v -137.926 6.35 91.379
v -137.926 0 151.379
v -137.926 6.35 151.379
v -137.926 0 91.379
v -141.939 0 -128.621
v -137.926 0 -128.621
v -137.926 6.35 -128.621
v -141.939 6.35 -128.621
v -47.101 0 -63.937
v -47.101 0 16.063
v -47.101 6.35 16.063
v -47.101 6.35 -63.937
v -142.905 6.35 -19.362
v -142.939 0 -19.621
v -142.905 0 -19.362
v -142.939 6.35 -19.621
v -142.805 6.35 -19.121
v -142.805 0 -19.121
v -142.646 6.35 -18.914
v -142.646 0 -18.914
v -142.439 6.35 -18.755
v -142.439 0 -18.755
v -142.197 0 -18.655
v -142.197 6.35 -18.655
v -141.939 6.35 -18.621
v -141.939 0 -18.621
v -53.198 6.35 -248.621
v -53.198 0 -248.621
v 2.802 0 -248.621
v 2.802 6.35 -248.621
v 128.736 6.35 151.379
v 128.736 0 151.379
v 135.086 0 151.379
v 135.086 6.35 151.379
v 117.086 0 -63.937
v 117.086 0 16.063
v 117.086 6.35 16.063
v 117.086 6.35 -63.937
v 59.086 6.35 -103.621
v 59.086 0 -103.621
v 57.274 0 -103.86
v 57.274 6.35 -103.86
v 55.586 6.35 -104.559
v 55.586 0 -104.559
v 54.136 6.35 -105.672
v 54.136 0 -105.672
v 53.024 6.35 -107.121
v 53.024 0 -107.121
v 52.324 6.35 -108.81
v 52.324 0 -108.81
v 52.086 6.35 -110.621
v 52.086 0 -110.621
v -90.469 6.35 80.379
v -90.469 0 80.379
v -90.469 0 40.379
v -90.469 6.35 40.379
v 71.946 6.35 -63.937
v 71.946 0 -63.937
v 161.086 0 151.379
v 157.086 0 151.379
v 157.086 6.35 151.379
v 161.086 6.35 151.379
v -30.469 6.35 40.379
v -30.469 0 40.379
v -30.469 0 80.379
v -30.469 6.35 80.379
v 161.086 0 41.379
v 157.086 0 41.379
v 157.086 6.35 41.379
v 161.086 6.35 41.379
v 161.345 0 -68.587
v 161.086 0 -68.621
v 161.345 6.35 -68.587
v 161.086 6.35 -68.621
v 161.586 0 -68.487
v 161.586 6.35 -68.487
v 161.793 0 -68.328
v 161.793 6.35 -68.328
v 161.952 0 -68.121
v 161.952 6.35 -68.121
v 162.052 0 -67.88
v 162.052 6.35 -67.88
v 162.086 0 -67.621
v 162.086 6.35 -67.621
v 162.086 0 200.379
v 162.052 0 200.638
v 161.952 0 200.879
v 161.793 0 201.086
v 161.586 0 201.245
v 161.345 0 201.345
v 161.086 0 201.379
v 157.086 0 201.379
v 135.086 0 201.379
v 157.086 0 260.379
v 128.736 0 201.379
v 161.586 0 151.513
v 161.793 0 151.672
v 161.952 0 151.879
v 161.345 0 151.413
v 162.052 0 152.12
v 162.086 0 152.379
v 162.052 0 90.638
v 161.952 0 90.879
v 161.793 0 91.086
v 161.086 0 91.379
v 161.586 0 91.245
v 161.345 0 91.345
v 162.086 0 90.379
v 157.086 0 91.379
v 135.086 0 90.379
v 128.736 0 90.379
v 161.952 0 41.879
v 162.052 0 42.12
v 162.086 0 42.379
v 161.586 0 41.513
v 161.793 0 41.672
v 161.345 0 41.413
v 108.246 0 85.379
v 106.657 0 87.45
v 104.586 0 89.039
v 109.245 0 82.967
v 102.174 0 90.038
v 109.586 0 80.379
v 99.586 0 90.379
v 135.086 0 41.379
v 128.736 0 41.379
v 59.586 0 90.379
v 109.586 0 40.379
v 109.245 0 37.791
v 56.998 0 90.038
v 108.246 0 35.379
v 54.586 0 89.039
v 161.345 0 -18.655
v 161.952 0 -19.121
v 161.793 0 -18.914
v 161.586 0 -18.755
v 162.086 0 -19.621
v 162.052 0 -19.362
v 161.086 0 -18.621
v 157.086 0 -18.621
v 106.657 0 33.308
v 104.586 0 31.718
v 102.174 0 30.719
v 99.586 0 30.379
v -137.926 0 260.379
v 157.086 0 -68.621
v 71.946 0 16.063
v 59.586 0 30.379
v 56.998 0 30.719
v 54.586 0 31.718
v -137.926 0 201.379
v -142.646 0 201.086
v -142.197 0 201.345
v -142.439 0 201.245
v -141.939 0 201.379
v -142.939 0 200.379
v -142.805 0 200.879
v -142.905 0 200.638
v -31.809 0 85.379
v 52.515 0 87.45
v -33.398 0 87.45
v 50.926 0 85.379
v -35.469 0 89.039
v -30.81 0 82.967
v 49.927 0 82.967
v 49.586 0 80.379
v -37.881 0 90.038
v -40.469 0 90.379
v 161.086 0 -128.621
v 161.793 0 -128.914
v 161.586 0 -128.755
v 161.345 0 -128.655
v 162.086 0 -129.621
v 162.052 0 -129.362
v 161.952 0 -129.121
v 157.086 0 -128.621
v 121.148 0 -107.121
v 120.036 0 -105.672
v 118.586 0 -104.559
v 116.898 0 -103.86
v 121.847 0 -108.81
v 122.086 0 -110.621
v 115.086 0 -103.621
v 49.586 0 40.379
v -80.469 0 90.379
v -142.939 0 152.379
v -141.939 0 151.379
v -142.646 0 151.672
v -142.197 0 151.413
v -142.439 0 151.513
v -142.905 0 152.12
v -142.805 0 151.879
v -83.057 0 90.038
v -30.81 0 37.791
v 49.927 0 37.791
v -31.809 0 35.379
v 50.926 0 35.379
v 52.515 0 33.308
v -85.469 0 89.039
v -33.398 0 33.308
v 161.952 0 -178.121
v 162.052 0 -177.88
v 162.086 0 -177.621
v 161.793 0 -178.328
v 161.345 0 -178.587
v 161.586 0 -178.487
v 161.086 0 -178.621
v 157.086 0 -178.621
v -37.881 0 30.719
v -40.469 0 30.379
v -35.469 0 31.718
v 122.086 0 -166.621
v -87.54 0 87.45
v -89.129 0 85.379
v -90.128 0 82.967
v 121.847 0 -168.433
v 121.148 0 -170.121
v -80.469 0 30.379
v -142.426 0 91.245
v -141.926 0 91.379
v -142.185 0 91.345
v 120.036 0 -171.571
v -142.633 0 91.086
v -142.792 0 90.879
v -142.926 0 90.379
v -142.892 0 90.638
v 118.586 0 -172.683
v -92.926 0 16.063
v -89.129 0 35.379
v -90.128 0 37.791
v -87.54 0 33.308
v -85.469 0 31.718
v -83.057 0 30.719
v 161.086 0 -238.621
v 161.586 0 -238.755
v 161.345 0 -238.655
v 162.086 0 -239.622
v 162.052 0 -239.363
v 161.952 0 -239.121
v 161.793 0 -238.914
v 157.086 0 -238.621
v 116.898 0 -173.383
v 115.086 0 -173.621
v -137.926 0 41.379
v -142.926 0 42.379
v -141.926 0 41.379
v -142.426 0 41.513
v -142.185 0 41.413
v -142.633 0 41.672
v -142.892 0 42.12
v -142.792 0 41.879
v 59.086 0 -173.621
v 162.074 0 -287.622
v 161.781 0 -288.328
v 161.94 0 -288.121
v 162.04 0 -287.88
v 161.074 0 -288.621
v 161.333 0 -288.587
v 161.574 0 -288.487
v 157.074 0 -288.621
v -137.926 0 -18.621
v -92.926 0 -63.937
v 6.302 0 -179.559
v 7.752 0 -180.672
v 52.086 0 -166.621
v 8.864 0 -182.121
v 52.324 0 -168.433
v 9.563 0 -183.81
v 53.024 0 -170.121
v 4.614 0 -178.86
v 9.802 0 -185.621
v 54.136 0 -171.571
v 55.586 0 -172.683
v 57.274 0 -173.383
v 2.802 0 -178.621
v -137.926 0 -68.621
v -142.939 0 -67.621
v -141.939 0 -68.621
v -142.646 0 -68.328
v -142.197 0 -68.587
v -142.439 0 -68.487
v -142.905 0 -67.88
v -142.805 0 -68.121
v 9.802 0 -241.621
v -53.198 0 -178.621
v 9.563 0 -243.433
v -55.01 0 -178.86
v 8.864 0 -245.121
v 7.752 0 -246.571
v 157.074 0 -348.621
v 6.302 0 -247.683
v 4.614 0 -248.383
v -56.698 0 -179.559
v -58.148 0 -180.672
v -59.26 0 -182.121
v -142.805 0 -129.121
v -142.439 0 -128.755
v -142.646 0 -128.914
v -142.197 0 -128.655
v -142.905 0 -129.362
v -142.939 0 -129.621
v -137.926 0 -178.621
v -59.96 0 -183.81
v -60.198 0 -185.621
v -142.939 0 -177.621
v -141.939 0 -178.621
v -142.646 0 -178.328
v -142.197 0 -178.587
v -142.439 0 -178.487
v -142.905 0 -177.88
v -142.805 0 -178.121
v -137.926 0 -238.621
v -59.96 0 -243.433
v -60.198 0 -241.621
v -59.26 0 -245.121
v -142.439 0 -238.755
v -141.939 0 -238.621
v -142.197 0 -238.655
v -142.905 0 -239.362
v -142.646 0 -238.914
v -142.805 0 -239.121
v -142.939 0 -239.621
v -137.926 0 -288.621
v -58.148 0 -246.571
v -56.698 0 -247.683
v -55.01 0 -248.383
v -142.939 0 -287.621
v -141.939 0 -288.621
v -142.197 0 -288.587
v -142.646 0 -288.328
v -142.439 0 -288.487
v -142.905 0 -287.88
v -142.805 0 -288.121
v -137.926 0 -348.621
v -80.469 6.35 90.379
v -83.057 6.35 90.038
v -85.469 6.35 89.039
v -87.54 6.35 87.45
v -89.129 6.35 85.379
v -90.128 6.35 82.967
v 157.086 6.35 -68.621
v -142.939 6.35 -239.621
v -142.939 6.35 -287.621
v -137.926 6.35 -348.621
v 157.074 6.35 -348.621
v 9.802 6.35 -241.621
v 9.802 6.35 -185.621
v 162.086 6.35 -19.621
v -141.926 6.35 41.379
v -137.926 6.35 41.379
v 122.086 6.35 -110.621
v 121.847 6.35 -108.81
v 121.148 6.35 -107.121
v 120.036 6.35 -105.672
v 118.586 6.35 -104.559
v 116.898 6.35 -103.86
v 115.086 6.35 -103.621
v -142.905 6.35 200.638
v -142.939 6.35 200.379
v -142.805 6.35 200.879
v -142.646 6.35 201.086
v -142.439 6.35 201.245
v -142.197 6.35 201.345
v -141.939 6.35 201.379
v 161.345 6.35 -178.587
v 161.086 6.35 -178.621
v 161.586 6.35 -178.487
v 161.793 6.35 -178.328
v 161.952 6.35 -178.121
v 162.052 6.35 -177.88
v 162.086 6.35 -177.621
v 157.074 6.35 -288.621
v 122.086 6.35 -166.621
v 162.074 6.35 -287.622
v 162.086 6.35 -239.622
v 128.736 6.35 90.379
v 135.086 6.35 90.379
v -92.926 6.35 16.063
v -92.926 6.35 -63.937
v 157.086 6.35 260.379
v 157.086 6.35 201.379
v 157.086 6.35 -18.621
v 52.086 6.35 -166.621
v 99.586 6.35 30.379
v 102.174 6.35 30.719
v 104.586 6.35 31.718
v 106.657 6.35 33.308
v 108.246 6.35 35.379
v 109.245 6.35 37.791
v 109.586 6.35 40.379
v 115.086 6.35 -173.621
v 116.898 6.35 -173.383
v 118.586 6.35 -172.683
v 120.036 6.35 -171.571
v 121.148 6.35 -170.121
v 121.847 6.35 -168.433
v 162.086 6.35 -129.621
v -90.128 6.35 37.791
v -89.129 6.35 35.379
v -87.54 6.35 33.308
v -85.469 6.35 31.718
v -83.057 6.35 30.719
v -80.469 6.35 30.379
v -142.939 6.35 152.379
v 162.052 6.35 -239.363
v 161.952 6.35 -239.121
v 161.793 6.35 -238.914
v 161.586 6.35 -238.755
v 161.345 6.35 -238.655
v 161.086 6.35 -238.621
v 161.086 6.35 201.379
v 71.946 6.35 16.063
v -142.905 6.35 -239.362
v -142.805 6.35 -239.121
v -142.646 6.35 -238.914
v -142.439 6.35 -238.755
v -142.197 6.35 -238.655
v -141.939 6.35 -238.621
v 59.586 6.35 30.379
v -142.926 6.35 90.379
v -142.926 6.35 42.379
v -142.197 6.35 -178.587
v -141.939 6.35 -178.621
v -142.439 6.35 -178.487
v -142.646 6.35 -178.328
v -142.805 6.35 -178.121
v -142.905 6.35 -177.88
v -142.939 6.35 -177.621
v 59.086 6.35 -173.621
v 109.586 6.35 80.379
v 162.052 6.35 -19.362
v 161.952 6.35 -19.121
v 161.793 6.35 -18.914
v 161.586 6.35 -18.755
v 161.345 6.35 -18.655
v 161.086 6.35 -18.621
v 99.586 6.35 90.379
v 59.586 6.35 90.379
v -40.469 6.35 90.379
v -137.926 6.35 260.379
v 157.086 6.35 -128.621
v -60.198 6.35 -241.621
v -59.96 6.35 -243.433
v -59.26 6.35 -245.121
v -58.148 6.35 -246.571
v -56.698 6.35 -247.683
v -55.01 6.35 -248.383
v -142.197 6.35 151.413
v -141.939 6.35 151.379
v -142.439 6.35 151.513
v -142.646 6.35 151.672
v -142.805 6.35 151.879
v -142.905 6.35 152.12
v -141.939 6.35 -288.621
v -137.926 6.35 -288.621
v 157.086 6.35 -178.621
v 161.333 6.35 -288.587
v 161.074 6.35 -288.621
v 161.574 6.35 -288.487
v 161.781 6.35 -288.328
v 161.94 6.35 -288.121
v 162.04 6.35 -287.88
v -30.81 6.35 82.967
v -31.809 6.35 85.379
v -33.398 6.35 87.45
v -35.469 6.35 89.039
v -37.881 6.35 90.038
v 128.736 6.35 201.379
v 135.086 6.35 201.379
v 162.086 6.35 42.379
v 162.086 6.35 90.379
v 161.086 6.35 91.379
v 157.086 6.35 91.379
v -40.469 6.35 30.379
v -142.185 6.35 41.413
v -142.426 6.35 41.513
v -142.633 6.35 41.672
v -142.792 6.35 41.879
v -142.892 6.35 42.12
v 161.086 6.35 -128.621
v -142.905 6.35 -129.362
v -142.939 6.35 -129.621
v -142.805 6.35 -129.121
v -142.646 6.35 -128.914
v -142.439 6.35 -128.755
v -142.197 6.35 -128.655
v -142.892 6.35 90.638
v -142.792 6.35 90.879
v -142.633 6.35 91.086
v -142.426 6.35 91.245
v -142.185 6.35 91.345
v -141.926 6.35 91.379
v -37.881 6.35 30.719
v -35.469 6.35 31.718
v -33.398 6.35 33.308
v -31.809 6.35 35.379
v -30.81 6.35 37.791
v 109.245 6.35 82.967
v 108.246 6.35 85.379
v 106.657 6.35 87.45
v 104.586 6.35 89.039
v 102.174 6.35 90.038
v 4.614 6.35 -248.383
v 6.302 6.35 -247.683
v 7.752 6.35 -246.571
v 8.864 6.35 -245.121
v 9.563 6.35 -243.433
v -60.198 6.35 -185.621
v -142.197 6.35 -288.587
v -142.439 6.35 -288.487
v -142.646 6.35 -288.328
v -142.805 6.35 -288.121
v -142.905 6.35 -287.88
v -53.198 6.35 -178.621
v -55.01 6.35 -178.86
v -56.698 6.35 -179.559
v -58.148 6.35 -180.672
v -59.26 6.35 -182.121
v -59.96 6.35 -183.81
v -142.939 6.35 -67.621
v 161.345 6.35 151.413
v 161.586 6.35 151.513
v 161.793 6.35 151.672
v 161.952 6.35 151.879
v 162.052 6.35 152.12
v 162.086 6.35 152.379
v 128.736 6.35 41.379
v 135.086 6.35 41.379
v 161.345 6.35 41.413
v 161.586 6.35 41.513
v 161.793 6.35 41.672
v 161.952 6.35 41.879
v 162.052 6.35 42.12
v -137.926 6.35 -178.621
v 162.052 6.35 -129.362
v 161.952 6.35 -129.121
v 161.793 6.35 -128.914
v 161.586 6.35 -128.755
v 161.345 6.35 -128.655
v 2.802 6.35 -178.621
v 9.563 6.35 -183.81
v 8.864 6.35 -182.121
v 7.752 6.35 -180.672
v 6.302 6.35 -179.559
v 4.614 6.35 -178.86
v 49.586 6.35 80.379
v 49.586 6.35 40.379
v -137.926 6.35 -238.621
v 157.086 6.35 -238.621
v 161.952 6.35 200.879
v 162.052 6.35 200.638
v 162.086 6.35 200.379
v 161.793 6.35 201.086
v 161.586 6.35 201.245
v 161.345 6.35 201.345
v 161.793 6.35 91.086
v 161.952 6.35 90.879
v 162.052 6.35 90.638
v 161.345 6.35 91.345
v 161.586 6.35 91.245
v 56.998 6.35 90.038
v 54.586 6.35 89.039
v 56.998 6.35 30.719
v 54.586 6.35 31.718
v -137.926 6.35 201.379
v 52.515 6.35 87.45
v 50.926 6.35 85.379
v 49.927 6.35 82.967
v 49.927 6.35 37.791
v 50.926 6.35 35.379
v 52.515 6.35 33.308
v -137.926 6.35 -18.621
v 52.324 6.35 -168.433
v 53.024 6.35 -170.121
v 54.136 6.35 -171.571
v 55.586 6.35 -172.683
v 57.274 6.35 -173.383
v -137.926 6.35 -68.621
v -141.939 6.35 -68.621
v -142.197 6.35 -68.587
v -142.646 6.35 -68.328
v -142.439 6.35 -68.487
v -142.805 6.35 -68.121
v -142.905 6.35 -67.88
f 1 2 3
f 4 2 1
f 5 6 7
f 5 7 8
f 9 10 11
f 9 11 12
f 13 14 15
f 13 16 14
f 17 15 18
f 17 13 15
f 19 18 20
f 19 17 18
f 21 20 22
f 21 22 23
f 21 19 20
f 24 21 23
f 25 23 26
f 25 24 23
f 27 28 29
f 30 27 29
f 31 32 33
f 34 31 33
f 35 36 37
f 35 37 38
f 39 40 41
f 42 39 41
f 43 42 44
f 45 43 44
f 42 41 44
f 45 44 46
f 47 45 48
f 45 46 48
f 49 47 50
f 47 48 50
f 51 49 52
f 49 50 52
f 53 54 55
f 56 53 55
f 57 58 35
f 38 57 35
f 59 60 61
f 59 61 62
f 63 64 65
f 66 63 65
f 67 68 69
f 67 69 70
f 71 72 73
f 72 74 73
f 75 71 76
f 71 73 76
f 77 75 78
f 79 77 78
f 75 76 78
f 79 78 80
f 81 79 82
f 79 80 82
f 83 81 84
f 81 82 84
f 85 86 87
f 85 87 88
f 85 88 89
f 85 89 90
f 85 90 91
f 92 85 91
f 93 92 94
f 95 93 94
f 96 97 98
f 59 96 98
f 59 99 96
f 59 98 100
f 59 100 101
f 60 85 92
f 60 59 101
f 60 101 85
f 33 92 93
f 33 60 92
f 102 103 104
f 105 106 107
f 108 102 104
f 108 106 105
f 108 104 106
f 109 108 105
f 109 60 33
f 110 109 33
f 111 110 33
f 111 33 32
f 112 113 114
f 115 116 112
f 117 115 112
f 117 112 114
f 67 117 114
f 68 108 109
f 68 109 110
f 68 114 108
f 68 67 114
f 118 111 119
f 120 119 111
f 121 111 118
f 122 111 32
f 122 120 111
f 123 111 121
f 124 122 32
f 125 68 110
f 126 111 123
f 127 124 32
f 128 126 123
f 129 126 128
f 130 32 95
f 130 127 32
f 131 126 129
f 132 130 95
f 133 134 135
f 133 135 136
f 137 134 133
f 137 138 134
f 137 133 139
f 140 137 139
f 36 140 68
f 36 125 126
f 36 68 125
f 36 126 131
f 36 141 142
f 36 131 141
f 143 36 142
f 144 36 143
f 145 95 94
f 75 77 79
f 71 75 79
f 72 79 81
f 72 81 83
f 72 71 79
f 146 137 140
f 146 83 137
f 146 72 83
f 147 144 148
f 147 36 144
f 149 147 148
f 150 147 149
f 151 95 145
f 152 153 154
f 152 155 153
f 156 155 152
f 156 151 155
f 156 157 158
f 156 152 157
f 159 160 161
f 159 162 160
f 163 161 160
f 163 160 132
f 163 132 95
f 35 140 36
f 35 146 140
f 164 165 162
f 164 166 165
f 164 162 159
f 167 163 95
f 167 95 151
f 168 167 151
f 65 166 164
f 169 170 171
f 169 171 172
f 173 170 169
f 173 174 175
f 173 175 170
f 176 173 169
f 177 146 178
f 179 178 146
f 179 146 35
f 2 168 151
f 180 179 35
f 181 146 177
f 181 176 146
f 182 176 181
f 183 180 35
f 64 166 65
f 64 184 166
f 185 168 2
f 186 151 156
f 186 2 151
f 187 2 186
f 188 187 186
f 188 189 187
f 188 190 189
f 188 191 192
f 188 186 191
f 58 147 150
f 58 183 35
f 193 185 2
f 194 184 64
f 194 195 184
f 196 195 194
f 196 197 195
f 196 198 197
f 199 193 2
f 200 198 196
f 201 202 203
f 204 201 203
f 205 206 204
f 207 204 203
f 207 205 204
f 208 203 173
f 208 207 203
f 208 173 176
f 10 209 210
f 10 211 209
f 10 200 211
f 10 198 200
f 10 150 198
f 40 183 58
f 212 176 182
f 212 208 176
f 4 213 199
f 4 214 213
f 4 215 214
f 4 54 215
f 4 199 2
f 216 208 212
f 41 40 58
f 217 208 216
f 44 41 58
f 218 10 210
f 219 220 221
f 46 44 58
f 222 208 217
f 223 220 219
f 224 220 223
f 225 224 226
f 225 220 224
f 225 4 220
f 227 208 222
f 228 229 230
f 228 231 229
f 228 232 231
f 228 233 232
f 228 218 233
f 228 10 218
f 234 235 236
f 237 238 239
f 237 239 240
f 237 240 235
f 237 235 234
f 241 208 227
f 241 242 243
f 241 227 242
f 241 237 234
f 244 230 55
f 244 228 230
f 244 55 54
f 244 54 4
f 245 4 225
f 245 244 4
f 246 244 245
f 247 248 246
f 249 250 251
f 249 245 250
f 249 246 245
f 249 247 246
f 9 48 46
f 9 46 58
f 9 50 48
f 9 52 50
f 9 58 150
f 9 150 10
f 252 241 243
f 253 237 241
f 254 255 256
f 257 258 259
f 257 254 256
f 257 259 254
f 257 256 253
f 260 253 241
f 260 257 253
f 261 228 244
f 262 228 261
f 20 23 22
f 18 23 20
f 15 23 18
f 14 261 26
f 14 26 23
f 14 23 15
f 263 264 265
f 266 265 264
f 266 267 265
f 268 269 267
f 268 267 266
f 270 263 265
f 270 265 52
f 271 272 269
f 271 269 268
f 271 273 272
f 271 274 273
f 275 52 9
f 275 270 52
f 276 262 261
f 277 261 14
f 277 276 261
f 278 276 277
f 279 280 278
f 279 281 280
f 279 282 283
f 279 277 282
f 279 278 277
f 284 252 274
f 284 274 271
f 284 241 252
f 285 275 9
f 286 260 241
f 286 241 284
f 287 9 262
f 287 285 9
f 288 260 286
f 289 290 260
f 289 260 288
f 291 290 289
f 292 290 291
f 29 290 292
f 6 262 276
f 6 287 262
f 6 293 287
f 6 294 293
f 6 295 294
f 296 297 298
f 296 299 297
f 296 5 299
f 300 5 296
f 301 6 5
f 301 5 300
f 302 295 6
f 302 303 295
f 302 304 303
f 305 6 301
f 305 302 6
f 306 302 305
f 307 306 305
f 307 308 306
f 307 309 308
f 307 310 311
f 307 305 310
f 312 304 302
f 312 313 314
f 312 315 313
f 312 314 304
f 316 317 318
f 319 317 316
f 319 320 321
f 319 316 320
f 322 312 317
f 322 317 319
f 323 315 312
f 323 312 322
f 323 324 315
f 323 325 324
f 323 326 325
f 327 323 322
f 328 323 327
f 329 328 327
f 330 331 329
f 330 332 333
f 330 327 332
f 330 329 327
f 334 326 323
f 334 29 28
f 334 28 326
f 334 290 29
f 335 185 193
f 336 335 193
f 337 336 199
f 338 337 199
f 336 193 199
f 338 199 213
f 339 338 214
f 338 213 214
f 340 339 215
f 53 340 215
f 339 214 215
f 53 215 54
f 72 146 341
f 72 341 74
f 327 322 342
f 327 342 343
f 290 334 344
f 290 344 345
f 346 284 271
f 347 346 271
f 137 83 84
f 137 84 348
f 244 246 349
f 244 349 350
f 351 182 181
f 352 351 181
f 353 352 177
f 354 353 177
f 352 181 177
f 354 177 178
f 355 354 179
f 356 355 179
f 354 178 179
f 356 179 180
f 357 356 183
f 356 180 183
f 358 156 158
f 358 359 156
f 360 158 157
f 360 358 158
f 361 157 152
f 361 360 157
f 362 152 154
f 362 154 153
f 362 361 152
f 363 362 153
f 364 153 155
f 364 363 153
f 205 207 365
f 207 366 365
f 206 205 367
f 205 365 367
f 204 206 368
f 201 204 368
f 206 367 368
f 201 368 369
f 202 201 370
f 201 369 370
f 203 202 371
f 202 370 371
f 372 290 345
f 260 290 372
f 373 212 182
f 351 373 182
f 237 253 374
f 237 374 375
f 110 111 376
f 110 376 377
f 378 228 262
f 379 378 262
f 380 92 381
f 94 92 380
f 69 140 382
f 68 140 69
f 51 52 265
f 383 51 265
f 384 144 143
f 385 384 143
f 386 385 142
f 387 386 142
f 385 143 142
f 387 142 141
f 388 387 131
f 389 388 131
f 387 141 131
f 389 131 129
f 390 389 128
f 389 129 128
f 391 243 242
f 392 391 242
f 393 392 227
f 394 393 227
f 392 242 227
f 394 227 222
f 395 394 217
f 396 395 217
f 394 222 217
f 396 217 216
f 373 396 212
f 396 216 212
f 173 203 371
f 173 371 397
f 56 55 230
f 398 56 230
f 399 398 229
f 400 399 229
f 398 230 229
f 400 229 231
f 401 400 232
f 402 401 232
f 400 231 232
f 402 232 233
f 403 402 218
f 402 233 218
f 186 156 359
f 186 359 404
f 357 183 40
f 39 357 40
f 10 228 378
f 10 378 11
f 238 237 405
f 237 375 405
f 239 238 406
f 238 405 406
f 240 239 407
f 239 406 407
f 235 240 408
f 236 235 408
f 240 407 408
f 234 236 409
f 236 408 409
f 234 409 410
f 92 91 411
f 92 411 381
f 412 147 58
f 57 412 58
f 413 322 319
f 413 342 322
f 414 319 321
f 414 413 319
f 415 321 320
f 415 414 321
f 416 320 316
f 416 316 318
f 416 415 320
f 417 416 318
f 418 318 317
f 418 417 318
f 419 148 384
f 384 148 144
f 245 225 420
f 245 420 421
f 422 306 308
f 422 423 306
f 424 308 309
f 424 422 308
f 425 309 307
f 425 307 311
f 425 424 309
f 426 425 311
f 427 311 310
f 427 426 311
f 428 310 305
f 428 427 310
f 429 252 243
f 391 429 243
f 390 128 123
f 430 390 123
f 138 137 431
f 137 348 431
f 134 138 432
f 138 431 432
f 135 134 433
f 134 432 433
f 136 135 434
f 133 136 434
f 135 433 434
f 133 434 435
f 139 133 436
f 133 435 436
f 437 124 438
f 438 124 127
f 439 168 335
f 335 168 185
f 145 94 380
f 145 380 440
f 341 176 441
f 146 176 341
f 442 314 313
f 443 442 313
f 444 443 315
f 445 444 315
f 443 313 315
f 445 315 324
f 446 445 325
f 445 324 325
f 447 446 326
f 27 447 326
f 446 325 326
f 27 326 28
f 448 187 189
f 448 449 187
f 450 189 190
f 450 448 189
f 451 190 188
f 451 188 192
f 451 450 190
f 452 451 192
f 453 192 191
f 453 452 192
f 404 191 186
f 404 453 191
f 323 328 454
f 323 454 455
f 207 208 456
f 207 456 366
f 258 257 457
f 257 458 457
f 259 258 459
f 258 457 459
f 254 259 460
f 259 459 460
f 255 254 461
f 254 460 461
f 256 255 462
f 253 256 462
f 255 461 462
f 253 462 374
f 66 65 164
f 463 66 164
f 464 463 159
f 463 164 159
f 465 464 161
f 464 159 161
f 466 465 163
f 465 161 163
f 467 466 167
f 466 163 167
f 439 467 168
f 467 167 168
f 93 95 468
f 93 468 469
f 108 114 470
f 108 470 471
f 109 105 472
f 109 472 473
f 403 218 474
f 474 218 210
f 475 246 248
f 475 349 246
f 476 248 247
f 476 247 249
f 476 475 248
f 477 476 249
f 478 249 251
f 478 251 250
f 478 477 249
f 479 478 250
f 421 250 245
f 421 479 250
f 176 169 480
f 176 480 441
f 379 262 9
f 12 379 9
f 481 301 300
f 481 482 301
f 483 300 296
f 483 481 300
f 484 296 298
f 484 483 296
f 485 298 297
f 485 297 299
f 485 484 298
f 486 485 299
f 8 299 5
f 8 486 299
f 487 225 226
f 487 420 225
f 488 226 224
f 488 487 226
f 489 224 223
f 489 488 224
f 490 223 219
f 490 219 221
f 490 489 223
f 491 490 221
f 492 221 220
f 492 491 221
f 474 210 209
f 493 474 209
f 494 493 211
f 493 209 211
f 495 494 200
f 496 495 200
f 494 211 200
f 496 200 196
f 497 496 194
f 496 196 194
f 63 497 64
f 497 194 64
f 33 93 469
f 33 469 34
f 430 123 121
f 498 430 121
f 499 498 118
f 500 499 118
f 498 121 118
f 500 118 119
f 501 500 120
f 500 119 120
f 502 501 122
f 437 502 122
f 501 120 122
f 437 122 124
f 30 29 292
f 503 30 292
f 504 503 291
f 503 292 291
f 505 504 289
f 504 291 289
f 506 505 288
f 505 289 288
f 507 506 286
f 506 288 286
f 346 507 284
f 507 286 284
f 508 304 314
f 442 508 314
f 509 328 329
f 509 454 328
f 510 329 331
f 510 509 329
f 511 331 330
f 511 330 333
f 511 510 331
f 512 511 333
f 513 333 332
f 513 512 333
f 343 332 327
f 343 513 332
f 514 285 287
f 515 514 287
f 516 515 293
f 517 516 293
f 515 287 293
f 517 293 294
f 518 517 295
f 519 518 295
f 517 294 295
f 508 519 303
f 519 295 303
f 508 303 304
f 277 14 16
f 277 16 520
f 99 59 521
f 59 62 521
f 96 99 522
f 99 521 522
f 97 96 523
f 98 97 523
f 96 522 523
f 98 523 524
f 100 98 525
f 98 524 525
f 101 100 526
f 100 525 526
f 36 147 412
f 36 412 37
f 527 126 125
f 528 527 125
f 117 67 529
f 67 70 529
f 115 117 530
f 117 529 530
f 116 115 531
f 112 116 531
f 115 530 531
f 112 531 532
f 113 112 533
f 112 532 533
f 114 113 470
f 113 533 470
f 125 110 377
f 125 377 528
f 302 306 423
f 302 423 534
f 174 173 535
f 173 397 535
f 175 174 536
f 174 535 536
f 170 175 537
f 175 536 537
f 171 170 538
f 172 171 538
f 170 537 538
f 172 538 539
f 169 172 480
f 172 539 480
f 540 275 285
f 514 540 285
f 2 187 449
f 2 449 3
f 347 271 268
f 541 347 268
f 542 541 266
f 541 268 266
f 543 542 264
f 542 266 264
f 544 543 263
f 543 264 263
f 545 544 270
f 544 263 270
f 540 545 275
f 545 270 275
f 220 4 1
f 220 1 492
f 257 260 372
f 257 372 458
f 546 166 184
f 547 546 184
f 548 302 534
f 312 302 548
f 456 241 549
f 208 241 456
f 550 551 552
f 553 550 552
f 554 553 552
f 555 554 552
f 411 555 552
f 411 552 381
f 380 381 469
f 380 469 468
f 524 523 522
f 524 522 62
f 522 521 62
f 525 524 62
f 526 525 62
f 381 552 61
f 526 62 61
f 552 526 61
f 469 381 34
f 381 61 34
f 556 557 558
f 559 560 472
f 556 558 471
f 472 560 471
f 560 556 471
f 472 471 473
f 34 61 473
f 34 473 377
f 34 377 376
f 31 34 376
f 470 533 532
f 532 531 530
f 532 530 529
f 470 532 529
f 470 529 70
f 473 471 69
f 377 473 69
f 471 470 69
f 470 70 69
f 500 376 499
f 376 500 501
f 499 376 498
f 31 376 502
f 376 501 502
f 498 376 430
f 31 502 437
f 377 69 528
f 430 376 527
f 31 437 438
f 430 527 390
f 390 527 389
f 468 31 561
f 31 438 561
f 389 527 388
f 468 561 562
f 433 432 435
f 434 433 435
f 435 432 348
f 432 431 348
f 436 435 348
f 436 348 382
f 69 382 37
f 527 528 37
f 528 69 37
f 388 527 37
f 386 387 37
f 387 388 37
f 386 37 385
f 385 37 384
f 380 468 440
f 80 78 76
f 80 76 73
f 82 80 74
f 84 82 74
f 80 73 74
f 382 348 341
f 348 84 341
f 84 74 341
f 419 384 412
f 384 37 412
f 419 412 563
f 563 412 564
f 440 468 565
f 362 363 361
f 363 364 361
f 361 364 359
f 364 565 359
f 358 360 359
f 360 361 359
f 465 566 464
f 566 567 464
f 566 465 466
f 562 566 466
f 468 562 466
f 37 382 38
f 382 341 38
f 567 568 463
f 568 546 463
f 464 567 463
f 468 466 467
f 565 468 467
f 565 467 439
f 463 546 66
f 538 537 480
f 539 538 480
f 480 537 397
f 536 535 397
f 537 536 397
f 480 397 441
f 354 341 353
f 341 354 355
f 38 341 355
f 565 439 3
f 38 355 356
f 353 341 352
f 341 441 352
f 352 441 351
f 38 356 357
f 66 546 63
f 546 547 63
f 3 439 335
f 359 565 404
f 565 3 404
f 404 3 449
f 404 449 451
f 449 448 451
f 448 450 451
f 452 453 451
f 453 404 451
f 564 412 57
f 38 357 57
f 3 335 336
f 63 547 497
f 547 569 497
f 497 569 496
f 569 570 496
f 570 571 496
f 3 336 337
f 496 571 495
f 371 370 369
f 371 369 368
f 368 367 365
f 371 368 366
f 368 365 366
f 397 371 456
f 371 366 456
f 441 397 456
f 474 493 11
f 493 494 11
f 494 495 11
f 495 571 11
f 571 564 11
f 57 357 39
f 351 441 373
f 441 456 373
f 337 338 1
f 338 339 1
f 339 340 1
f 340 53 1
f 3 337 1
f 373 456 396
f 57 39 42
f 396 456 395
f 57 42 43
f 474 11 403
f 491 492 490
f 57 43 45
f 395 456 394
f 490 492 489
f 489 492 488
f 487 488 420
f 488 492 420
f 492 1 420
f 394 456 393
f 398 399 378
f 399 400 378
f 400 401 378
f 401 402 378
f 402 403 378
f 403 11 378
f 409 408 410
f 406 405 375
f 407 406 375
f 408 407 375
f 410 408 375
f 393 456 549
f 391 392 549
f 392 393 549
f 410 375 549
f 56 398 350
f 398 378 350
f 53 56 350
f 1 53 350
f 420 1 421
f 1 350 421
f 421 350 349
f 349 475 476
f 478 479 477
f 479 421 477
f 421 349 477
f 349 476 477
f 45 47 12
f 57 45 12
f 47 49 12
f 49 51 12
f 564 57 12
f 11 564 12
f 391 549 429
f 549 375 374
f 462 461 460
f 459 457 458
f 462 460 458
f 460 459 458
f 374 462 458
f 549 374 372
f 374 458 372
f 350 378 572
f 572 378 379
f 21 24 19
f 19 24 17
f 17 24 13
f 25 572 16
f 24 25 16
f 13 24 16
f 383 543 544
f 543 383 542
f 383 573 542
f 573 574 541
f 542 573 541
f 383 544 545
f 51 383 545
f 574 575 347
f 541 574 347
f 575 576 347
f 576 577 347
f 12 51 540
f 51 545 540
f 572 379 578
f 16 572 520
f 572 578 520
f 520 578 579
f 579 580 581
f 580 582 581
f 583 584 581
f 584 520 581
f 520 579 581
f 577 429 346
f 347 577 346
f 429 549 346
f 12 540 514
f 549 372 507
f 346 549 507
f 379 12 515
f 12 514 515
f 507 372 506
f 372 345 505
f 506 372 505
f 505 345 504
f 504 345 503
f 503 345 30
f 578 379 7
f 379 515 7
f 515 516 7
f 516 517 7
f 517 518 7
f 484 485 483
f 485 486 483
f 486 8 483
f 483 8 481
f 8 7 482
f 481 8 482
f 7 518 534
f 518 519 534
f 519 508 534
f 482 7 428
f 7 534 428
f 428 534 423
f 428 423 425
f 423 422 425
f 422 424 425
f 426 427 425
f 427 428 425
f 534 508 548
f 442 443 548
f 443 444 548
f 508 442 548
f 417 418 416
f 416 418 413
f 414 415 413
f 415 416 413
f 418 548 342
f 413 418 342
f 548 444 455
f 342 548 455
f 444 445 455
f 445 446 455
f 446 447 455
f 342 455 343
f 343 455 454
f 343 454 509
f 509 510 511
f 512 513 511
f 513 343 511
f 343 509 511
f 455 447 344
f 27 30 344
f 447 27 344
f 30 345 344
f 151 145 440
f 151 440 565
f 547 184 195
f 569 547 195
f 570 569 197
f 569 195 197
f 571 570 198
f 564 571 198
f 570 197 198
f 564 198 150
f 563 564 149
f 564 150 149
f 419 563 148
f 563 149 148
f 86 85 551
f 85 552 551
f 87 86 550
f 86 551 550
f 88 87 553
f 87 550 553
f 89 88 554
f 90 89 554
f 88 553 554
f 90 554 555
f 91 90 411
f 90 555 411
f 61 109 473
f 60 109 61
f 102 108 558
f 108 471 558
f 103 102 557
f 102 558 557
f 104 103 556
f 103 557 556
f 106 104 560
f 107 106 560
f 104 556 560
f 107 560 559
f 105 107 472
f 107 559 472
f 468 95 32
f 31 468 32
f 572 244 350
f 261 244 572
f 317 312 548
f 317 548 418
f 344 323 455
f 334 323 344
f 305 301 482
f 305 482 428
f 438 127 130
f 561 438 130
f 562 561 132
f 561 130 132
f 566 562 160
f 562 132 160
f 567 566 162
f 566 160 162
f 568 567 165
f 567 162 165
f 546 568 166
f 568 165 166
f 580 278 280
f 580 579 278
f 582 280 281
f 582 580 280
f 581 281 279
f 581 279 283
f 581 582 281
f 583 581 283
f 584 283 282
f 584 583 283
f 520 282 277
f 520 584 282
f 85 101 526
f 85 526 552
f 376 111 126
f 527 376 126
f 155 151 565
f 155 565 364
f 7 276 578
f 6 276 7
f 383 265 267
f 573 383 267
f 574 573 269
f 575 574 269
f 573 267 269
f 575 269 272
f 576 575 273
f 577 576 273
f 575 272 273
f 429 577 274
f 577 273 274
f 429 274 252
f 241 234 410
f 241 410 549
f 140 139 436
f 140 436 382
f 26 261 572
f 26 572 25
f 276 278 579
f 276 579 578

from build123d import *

# Parameters (mm, degrees)
SKETCH1_W           = 6.35
SKETCH1_H           = 50
SKETCH1_H_2         = 49
SKETCH1_W_2         = 45.825573982
SKETCH1_H_3         = 80
SKETCH1_W_3         = 45.139685757
BOSS_EXTRUDE1_DEPTH = 6.35
FILLET1_R           = 1


with BuildPart() as part:
    # Sketch1 → Boss-Extrude1 (new body)
    with BuildSketch(Plane(origin=(0, 0, 0), x_dir=(1, 0, 0), z_dir=(0, 1, 0))):
        Polygon((157.073624904, 348.621301775), (157.073624902, 288.621301775), (162.073624902, 288.621300264), (162.085917882, 238.621301775), (157.085917882, 238.621301775), (157.085917882, 178.621301775), (162.085917882, 178.621301775), (162.085917882, 128.621301775), (157.085917882, 128.621301775), (157.085917882, 68.621301775), (162.085917882, 68.621301775), (162.085917882, 18.621301775), (157.085917882, 18.621301775), (157.085917882, -41.378698225), (162.085917882, -41.378698225), (162.085917882, -91.378698225), (157.085917882, -91.378698225), (157.085917882, -151.378698225), (162.085917882, -151.378698225), (162.085917882, -201.378698225), (157.085917882, -201.378698225), (157.085917882, -260.378698225), (-137.926375098, -260.378698225), (-137.926375098, -201.378698225), (-142.938668078, -201.378698225), (-142.938668078, -151.378698225), (-137.926375098, -151.378698225), (-137.926375098, -91.378698225), (-142.926375098, -91.378698225), (-142.926375098, -41.378698225), (-137.926375098, -41.378698225), (-137.926375098, 18.621301775), (-142.938668078, 18.621301775), (-142.938668078, 68.621301775), (-137.926375098, 68.621301775), (-137.926375098, 128.621301775), (-142.938668078, 128.621301775), (-142.938668078, 178.621301775), (-137.926375098, 178.621301775), (-137.926375098, 238.621301775), (-142.938668078, 238.621301775), (-142.938668078, 288.621301775), (-137.926375096, 288.621301775), (-137.926375096, 348.621301775), align=None)
        with BuildLine():
            Line((-80.468838102, -30.378698225), (-40.468838102, -30.378698225))
            ThreePointArc((-40.468838102, -30.378698225), (-33.39777029, -33.307630413), (-30.468838102, -40.378698225))
            Line((-30.468838102, -40.378698225), (-30.468838102, -80.378698225))
            ThreePointArc((-30.468838102, -80.378698225), (-33.39777029, -87.449766037), (-40.468838102, -90.378698225))
            Line((-40.468838102, -90.378698225), (-80.468838102, -90.378698225))
            ThreePointArc((-80.468838102, -90.378698225), (-87.539905914, -87.449766037), (-90.468838102, -80.378698225))
            Line((-90.468838102, -80.378698225), (-90.468838102, -40.378698225))
            ThreePointArc((-90.468838102, -40.378698225), (-87.539905914, -33.307630413), (-80.468838102, -30.378698225))
        make_face(mode=Mode.SUBTRACT)
        with BuildLine():
            Line((59.585917882, -30.378698225), (99.585917882, -30.378698225))
            ThreePointArc((99.585917882, -30.378698225), (106.656985694, -33.307630413), (109.585917882, -40.378698225))
            Line((109.585917882, -40.378698225), (109.585917882, -80.378698225))
            ThreePointArc((109.585917882, -80.378698225), (106.656985694, -87.449766037), (99.585917882, -90.378698225))
            Line((99.585917882, -90.378698225), (59.585917882, -90.378698225))
            ThreePointArc((59.585917882, -90.378698225), (52.51485007, -87.449766037), (49.585917882, -80.378698225))
            Line((49.585917882, -80.378698225), (49.585917882, -40.378698225))
            ThreePointArc((49.585917882, -40.378698225), (52.51485007, -33.307630413), (59.585917882, -30.378698225))
        make_face(mode=Mode.SUBTRACT)
        with Locations((131.910917882, -176.378698225)):
            Rectangle(SKETCH1_W, SKETCH1_H, mode=Mode.SUBTRACT)
        with Locations((131.910917882, -65.878698225)):
            Rectangle(SKETCH1_W, SKETCH1_H_2, mode=Mode.SUBTRACT)
        with BuildLine():
            Line((-53.19802656, 248.621301775), (2.80197344, 248.621301775))
            ThreePointArc((2.80197344, 248.621301775), (7.751720908, 246.571049243), (9.80197344, 241.621301775))
            Line((9.80197344, 241.621301775), (9.80197344, 185.621301775))
            ThreePointArc((9.80197344, 185.621301775), (7.751720908, 180.671554307), (2.80197344, 178.621301775))
            Line((2.80197344, 178.621301775), (-53.198026561, 178.621301775))
            ThreePointArc((-53.198026561, 178.621301775), (-58.147774029, 180.671554307), (-60.198026561, 185.621301775))
            Line((-60.198026561, 185.621301775), (-60.19802656, 241.621301775))
            ThreePointArc((-60.19802656, 241.621301775), (-58.147774029, 246.571049243), (-53.19802656, 248.621301775))
        make_face(mode=Mode.SUBTRACT)
        with BuildLine():
            Line((59.085917882, 173.621301775), (115.085917882, 173.621301775))
            ThreePointArc((115.085917882, 173.621301775), (120.03566535, 171.571049243), (122.085917882, 166.621301775))
            Line((122.085917882, 166.621301775), (122.085917882, 110.621301775))
            ThreePointArc((122.085917882, 110.621301775), (120.03566535, 105.671554307), (115.085917882, 103.621301775))
            Line((115.085917882, 103.621301775), (59.085917882, 103.621301775))
            ThreePointArc((59.085917882, 103.621301775), (54.136170414, 105.671554307), (52.085917882, 110.621301775))
            Line((52.085917882, 110.621301775), (52.085917882, 166.621301775))
            ThreePointArc((52.085917882, 166.621301775), (54.136170414, 171.571049243), (59.085917882, 173.621301775))
        make_face(mode=Mode.SUBTRACT)
        with Locations((-70.013588107, 23.936670646)):
            Rectangle(SKETCH1_W_2, SKETCH1_H_3, mode=Mode.SUBTRACT)
        with Locations((94.516075004, 23.936670646)):
            Rectangle(SKETCH1_W_3, SKETCH1_H_3, mode=Mode.SUBTRACT)
    extrude(amount=BOSS_EXTRUDE1_DEPTH)

    # Fillet1
    fillet1_edges = [part.edges().sort_by_distance(p)[0] for p in [
        (162.073624902, 3.175, -288.621300264),
        (162.085917882, 3.175, -238.621301775),
        (162.085917882, 3.175, -178.621301775),
        (162.085917882, 3.175, -128.621301775),
        (162.085917882, 3.175, -68.621301775),
        (162.085917882, 3.175, -18.621301775),
        (162.085917882, 3.175, 41.378698225),
        (162.085917882, 3.175, 91.378698225),
        (162.085917882, 3.175, 151.378698225),
        (162.085917882, 3.175, 201.378698225),
        (-142.938668078, 3.175, 201.378698225),
        (-142.938668078, 3.175, 151.378698225),
        (-142.926375098, 3.175, 91.378698225),
        (-142.926375098, 3.175, 41.378698225),
        (-142.938668078, 3.175, -18.621301775),
        (-142.938668078, 3.175, -68.621301775),
        (-142.938668078, 3.175, -128.621301775),
        (-142.938668078, 3.175, -178.621301775),
        (-142.938668078, 3.175, -238.621301775),
        (-142.938668078, 3.175, -288.621301775),
    ]]
    fillet(fillet1_edges, radius=FILLET1_R)


solid = part.part
